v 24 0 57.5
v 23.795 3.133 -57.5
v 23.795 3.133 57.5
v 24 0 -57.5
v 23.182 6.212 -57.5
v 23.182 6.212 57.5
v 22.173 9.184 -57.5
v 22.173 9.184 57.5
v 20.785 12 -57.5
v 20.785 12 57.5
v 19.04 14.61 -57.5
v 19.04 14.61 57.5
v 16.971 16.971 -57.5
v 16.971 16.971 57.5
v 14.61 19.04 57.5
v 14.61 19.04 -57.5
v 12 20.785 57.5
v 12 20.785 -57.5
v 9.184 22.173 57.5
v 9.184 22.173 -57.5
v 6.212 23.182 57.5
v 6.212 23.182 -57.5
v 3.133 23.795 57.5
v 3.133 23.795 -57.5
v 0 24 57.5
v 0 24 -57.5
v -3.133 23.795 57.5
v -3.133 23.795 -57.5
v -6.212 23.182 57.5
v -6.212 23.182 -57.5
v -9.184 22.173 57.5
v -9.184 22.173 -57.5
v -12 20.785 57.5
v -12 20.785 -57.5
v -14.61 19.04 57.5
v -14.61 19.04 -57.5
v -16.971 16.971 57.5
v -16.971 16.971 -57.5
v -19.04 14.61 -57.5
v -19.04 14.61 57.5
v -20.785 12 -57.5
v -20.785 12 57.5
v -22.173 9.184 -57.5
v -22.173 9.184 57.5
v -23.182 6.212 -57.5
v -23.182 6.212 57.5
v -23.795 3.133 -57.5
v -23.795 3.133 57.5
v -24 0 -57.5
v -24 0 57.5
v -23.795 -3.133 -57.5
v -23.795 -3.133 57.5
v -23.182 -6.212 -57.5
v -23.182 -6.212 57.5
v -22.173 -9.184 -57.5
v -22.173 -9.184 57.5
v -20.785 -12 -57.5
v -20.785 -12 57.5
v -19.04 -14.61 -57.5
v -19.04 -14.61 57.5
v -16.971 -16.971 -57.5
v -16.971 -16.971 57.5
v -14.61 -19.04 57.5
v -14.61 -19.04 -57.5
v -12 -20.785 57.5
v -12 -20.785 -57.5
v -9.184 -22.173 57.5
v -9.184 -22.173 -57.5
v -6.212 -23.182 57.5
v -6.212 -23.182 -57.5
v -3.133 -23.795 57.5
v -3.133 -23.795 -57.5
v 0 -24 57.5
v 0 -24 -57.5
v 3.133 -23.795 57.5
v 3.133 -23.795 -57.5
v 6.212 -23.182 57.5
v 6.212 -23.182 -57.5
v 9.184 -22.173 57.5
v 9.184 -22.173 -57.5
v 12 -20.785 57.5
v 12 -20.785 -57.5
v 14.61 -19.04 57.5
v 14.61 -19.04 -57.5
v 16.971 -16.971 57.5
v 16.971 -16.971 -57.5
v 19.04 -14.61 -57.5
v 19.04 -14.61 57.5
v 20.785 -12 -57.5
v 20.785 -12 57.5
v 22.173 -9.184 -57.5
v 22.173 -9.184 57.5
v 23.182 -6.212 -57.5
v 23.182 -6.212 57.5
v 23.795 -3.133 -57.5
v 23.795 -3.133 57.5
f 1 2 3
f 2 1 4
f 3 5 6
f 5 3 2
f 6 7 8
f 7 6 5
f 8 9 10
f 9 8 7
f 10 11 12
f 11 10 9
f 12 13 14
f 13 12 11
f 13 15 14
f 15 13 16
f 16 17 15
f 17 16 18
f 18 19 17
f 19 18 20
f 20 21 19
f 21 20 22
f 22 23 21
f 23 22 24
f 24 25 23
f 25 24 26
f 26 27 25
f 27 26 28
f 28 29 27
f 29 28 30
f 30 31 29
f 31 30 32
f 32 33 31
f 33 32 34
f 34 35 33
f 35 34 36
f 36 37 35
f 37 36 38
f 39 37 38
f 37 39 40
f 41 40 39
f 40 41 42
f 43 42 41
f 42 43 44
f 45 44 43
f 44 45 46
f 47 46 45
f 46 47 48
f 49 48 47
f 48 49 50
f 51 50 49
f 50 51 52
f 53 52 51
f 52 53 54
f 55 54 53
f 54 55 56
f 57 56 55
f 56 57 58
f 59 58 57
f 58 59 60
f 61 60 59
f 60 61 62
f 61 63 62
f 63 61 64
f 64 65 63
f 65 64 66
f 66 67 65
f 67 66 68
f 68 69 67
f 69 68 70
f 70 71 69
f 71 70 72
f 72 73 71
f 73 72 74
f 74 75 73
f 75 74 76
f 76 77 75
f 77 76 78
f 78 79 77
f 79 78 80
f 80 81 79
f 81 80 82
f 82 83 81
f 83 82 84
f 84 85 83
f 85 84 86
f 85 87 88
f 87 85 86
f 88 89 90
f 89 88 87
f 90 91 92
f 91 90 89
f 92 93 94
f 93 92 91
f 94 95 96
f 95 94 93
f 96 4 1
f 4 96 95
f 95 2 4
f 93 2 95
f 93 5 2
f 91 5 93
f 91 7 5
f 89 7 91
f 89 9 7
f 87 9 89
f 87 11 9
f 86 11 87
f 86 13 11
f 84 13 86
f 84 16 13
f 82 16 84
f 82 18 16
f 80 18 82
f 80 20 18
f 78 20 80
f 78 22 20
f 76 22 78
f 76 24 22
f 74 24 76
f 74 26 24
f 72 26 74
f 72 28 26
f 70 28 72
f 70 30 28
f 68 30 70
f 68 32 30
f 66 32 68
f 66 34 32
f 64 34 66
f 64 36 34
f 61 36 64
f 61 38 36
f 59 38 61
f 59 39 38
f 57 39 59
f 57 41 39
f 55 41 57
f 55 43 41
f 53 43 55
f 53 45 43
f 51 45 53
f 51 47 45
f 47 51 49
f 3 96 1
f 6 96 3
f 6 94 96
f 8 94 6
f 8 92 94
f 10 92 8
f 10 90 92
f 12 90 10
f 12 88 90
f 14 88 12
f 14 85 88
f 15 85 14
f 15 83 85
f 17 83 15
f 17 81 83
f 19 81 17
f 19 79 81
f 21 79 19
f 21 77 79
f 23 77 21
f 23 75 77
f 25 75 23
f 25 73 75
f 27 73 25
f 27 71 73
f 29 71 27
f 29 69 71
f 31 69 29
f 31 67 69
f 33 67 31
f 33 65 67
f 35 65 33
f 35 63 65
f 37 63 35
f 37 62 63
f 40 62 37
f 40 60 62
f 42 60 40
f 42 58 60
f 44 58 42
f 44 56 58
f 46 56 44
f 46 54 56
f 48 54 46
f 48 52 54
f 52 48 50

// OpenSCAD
// ========================================
// a cylinder with radius 24 mm and height 115 mm
// NeuroCAD canonical IR; dimensions are millimetres
// ========================================
$fn = 48;

cylinder(r=24, h=115, center=true);
